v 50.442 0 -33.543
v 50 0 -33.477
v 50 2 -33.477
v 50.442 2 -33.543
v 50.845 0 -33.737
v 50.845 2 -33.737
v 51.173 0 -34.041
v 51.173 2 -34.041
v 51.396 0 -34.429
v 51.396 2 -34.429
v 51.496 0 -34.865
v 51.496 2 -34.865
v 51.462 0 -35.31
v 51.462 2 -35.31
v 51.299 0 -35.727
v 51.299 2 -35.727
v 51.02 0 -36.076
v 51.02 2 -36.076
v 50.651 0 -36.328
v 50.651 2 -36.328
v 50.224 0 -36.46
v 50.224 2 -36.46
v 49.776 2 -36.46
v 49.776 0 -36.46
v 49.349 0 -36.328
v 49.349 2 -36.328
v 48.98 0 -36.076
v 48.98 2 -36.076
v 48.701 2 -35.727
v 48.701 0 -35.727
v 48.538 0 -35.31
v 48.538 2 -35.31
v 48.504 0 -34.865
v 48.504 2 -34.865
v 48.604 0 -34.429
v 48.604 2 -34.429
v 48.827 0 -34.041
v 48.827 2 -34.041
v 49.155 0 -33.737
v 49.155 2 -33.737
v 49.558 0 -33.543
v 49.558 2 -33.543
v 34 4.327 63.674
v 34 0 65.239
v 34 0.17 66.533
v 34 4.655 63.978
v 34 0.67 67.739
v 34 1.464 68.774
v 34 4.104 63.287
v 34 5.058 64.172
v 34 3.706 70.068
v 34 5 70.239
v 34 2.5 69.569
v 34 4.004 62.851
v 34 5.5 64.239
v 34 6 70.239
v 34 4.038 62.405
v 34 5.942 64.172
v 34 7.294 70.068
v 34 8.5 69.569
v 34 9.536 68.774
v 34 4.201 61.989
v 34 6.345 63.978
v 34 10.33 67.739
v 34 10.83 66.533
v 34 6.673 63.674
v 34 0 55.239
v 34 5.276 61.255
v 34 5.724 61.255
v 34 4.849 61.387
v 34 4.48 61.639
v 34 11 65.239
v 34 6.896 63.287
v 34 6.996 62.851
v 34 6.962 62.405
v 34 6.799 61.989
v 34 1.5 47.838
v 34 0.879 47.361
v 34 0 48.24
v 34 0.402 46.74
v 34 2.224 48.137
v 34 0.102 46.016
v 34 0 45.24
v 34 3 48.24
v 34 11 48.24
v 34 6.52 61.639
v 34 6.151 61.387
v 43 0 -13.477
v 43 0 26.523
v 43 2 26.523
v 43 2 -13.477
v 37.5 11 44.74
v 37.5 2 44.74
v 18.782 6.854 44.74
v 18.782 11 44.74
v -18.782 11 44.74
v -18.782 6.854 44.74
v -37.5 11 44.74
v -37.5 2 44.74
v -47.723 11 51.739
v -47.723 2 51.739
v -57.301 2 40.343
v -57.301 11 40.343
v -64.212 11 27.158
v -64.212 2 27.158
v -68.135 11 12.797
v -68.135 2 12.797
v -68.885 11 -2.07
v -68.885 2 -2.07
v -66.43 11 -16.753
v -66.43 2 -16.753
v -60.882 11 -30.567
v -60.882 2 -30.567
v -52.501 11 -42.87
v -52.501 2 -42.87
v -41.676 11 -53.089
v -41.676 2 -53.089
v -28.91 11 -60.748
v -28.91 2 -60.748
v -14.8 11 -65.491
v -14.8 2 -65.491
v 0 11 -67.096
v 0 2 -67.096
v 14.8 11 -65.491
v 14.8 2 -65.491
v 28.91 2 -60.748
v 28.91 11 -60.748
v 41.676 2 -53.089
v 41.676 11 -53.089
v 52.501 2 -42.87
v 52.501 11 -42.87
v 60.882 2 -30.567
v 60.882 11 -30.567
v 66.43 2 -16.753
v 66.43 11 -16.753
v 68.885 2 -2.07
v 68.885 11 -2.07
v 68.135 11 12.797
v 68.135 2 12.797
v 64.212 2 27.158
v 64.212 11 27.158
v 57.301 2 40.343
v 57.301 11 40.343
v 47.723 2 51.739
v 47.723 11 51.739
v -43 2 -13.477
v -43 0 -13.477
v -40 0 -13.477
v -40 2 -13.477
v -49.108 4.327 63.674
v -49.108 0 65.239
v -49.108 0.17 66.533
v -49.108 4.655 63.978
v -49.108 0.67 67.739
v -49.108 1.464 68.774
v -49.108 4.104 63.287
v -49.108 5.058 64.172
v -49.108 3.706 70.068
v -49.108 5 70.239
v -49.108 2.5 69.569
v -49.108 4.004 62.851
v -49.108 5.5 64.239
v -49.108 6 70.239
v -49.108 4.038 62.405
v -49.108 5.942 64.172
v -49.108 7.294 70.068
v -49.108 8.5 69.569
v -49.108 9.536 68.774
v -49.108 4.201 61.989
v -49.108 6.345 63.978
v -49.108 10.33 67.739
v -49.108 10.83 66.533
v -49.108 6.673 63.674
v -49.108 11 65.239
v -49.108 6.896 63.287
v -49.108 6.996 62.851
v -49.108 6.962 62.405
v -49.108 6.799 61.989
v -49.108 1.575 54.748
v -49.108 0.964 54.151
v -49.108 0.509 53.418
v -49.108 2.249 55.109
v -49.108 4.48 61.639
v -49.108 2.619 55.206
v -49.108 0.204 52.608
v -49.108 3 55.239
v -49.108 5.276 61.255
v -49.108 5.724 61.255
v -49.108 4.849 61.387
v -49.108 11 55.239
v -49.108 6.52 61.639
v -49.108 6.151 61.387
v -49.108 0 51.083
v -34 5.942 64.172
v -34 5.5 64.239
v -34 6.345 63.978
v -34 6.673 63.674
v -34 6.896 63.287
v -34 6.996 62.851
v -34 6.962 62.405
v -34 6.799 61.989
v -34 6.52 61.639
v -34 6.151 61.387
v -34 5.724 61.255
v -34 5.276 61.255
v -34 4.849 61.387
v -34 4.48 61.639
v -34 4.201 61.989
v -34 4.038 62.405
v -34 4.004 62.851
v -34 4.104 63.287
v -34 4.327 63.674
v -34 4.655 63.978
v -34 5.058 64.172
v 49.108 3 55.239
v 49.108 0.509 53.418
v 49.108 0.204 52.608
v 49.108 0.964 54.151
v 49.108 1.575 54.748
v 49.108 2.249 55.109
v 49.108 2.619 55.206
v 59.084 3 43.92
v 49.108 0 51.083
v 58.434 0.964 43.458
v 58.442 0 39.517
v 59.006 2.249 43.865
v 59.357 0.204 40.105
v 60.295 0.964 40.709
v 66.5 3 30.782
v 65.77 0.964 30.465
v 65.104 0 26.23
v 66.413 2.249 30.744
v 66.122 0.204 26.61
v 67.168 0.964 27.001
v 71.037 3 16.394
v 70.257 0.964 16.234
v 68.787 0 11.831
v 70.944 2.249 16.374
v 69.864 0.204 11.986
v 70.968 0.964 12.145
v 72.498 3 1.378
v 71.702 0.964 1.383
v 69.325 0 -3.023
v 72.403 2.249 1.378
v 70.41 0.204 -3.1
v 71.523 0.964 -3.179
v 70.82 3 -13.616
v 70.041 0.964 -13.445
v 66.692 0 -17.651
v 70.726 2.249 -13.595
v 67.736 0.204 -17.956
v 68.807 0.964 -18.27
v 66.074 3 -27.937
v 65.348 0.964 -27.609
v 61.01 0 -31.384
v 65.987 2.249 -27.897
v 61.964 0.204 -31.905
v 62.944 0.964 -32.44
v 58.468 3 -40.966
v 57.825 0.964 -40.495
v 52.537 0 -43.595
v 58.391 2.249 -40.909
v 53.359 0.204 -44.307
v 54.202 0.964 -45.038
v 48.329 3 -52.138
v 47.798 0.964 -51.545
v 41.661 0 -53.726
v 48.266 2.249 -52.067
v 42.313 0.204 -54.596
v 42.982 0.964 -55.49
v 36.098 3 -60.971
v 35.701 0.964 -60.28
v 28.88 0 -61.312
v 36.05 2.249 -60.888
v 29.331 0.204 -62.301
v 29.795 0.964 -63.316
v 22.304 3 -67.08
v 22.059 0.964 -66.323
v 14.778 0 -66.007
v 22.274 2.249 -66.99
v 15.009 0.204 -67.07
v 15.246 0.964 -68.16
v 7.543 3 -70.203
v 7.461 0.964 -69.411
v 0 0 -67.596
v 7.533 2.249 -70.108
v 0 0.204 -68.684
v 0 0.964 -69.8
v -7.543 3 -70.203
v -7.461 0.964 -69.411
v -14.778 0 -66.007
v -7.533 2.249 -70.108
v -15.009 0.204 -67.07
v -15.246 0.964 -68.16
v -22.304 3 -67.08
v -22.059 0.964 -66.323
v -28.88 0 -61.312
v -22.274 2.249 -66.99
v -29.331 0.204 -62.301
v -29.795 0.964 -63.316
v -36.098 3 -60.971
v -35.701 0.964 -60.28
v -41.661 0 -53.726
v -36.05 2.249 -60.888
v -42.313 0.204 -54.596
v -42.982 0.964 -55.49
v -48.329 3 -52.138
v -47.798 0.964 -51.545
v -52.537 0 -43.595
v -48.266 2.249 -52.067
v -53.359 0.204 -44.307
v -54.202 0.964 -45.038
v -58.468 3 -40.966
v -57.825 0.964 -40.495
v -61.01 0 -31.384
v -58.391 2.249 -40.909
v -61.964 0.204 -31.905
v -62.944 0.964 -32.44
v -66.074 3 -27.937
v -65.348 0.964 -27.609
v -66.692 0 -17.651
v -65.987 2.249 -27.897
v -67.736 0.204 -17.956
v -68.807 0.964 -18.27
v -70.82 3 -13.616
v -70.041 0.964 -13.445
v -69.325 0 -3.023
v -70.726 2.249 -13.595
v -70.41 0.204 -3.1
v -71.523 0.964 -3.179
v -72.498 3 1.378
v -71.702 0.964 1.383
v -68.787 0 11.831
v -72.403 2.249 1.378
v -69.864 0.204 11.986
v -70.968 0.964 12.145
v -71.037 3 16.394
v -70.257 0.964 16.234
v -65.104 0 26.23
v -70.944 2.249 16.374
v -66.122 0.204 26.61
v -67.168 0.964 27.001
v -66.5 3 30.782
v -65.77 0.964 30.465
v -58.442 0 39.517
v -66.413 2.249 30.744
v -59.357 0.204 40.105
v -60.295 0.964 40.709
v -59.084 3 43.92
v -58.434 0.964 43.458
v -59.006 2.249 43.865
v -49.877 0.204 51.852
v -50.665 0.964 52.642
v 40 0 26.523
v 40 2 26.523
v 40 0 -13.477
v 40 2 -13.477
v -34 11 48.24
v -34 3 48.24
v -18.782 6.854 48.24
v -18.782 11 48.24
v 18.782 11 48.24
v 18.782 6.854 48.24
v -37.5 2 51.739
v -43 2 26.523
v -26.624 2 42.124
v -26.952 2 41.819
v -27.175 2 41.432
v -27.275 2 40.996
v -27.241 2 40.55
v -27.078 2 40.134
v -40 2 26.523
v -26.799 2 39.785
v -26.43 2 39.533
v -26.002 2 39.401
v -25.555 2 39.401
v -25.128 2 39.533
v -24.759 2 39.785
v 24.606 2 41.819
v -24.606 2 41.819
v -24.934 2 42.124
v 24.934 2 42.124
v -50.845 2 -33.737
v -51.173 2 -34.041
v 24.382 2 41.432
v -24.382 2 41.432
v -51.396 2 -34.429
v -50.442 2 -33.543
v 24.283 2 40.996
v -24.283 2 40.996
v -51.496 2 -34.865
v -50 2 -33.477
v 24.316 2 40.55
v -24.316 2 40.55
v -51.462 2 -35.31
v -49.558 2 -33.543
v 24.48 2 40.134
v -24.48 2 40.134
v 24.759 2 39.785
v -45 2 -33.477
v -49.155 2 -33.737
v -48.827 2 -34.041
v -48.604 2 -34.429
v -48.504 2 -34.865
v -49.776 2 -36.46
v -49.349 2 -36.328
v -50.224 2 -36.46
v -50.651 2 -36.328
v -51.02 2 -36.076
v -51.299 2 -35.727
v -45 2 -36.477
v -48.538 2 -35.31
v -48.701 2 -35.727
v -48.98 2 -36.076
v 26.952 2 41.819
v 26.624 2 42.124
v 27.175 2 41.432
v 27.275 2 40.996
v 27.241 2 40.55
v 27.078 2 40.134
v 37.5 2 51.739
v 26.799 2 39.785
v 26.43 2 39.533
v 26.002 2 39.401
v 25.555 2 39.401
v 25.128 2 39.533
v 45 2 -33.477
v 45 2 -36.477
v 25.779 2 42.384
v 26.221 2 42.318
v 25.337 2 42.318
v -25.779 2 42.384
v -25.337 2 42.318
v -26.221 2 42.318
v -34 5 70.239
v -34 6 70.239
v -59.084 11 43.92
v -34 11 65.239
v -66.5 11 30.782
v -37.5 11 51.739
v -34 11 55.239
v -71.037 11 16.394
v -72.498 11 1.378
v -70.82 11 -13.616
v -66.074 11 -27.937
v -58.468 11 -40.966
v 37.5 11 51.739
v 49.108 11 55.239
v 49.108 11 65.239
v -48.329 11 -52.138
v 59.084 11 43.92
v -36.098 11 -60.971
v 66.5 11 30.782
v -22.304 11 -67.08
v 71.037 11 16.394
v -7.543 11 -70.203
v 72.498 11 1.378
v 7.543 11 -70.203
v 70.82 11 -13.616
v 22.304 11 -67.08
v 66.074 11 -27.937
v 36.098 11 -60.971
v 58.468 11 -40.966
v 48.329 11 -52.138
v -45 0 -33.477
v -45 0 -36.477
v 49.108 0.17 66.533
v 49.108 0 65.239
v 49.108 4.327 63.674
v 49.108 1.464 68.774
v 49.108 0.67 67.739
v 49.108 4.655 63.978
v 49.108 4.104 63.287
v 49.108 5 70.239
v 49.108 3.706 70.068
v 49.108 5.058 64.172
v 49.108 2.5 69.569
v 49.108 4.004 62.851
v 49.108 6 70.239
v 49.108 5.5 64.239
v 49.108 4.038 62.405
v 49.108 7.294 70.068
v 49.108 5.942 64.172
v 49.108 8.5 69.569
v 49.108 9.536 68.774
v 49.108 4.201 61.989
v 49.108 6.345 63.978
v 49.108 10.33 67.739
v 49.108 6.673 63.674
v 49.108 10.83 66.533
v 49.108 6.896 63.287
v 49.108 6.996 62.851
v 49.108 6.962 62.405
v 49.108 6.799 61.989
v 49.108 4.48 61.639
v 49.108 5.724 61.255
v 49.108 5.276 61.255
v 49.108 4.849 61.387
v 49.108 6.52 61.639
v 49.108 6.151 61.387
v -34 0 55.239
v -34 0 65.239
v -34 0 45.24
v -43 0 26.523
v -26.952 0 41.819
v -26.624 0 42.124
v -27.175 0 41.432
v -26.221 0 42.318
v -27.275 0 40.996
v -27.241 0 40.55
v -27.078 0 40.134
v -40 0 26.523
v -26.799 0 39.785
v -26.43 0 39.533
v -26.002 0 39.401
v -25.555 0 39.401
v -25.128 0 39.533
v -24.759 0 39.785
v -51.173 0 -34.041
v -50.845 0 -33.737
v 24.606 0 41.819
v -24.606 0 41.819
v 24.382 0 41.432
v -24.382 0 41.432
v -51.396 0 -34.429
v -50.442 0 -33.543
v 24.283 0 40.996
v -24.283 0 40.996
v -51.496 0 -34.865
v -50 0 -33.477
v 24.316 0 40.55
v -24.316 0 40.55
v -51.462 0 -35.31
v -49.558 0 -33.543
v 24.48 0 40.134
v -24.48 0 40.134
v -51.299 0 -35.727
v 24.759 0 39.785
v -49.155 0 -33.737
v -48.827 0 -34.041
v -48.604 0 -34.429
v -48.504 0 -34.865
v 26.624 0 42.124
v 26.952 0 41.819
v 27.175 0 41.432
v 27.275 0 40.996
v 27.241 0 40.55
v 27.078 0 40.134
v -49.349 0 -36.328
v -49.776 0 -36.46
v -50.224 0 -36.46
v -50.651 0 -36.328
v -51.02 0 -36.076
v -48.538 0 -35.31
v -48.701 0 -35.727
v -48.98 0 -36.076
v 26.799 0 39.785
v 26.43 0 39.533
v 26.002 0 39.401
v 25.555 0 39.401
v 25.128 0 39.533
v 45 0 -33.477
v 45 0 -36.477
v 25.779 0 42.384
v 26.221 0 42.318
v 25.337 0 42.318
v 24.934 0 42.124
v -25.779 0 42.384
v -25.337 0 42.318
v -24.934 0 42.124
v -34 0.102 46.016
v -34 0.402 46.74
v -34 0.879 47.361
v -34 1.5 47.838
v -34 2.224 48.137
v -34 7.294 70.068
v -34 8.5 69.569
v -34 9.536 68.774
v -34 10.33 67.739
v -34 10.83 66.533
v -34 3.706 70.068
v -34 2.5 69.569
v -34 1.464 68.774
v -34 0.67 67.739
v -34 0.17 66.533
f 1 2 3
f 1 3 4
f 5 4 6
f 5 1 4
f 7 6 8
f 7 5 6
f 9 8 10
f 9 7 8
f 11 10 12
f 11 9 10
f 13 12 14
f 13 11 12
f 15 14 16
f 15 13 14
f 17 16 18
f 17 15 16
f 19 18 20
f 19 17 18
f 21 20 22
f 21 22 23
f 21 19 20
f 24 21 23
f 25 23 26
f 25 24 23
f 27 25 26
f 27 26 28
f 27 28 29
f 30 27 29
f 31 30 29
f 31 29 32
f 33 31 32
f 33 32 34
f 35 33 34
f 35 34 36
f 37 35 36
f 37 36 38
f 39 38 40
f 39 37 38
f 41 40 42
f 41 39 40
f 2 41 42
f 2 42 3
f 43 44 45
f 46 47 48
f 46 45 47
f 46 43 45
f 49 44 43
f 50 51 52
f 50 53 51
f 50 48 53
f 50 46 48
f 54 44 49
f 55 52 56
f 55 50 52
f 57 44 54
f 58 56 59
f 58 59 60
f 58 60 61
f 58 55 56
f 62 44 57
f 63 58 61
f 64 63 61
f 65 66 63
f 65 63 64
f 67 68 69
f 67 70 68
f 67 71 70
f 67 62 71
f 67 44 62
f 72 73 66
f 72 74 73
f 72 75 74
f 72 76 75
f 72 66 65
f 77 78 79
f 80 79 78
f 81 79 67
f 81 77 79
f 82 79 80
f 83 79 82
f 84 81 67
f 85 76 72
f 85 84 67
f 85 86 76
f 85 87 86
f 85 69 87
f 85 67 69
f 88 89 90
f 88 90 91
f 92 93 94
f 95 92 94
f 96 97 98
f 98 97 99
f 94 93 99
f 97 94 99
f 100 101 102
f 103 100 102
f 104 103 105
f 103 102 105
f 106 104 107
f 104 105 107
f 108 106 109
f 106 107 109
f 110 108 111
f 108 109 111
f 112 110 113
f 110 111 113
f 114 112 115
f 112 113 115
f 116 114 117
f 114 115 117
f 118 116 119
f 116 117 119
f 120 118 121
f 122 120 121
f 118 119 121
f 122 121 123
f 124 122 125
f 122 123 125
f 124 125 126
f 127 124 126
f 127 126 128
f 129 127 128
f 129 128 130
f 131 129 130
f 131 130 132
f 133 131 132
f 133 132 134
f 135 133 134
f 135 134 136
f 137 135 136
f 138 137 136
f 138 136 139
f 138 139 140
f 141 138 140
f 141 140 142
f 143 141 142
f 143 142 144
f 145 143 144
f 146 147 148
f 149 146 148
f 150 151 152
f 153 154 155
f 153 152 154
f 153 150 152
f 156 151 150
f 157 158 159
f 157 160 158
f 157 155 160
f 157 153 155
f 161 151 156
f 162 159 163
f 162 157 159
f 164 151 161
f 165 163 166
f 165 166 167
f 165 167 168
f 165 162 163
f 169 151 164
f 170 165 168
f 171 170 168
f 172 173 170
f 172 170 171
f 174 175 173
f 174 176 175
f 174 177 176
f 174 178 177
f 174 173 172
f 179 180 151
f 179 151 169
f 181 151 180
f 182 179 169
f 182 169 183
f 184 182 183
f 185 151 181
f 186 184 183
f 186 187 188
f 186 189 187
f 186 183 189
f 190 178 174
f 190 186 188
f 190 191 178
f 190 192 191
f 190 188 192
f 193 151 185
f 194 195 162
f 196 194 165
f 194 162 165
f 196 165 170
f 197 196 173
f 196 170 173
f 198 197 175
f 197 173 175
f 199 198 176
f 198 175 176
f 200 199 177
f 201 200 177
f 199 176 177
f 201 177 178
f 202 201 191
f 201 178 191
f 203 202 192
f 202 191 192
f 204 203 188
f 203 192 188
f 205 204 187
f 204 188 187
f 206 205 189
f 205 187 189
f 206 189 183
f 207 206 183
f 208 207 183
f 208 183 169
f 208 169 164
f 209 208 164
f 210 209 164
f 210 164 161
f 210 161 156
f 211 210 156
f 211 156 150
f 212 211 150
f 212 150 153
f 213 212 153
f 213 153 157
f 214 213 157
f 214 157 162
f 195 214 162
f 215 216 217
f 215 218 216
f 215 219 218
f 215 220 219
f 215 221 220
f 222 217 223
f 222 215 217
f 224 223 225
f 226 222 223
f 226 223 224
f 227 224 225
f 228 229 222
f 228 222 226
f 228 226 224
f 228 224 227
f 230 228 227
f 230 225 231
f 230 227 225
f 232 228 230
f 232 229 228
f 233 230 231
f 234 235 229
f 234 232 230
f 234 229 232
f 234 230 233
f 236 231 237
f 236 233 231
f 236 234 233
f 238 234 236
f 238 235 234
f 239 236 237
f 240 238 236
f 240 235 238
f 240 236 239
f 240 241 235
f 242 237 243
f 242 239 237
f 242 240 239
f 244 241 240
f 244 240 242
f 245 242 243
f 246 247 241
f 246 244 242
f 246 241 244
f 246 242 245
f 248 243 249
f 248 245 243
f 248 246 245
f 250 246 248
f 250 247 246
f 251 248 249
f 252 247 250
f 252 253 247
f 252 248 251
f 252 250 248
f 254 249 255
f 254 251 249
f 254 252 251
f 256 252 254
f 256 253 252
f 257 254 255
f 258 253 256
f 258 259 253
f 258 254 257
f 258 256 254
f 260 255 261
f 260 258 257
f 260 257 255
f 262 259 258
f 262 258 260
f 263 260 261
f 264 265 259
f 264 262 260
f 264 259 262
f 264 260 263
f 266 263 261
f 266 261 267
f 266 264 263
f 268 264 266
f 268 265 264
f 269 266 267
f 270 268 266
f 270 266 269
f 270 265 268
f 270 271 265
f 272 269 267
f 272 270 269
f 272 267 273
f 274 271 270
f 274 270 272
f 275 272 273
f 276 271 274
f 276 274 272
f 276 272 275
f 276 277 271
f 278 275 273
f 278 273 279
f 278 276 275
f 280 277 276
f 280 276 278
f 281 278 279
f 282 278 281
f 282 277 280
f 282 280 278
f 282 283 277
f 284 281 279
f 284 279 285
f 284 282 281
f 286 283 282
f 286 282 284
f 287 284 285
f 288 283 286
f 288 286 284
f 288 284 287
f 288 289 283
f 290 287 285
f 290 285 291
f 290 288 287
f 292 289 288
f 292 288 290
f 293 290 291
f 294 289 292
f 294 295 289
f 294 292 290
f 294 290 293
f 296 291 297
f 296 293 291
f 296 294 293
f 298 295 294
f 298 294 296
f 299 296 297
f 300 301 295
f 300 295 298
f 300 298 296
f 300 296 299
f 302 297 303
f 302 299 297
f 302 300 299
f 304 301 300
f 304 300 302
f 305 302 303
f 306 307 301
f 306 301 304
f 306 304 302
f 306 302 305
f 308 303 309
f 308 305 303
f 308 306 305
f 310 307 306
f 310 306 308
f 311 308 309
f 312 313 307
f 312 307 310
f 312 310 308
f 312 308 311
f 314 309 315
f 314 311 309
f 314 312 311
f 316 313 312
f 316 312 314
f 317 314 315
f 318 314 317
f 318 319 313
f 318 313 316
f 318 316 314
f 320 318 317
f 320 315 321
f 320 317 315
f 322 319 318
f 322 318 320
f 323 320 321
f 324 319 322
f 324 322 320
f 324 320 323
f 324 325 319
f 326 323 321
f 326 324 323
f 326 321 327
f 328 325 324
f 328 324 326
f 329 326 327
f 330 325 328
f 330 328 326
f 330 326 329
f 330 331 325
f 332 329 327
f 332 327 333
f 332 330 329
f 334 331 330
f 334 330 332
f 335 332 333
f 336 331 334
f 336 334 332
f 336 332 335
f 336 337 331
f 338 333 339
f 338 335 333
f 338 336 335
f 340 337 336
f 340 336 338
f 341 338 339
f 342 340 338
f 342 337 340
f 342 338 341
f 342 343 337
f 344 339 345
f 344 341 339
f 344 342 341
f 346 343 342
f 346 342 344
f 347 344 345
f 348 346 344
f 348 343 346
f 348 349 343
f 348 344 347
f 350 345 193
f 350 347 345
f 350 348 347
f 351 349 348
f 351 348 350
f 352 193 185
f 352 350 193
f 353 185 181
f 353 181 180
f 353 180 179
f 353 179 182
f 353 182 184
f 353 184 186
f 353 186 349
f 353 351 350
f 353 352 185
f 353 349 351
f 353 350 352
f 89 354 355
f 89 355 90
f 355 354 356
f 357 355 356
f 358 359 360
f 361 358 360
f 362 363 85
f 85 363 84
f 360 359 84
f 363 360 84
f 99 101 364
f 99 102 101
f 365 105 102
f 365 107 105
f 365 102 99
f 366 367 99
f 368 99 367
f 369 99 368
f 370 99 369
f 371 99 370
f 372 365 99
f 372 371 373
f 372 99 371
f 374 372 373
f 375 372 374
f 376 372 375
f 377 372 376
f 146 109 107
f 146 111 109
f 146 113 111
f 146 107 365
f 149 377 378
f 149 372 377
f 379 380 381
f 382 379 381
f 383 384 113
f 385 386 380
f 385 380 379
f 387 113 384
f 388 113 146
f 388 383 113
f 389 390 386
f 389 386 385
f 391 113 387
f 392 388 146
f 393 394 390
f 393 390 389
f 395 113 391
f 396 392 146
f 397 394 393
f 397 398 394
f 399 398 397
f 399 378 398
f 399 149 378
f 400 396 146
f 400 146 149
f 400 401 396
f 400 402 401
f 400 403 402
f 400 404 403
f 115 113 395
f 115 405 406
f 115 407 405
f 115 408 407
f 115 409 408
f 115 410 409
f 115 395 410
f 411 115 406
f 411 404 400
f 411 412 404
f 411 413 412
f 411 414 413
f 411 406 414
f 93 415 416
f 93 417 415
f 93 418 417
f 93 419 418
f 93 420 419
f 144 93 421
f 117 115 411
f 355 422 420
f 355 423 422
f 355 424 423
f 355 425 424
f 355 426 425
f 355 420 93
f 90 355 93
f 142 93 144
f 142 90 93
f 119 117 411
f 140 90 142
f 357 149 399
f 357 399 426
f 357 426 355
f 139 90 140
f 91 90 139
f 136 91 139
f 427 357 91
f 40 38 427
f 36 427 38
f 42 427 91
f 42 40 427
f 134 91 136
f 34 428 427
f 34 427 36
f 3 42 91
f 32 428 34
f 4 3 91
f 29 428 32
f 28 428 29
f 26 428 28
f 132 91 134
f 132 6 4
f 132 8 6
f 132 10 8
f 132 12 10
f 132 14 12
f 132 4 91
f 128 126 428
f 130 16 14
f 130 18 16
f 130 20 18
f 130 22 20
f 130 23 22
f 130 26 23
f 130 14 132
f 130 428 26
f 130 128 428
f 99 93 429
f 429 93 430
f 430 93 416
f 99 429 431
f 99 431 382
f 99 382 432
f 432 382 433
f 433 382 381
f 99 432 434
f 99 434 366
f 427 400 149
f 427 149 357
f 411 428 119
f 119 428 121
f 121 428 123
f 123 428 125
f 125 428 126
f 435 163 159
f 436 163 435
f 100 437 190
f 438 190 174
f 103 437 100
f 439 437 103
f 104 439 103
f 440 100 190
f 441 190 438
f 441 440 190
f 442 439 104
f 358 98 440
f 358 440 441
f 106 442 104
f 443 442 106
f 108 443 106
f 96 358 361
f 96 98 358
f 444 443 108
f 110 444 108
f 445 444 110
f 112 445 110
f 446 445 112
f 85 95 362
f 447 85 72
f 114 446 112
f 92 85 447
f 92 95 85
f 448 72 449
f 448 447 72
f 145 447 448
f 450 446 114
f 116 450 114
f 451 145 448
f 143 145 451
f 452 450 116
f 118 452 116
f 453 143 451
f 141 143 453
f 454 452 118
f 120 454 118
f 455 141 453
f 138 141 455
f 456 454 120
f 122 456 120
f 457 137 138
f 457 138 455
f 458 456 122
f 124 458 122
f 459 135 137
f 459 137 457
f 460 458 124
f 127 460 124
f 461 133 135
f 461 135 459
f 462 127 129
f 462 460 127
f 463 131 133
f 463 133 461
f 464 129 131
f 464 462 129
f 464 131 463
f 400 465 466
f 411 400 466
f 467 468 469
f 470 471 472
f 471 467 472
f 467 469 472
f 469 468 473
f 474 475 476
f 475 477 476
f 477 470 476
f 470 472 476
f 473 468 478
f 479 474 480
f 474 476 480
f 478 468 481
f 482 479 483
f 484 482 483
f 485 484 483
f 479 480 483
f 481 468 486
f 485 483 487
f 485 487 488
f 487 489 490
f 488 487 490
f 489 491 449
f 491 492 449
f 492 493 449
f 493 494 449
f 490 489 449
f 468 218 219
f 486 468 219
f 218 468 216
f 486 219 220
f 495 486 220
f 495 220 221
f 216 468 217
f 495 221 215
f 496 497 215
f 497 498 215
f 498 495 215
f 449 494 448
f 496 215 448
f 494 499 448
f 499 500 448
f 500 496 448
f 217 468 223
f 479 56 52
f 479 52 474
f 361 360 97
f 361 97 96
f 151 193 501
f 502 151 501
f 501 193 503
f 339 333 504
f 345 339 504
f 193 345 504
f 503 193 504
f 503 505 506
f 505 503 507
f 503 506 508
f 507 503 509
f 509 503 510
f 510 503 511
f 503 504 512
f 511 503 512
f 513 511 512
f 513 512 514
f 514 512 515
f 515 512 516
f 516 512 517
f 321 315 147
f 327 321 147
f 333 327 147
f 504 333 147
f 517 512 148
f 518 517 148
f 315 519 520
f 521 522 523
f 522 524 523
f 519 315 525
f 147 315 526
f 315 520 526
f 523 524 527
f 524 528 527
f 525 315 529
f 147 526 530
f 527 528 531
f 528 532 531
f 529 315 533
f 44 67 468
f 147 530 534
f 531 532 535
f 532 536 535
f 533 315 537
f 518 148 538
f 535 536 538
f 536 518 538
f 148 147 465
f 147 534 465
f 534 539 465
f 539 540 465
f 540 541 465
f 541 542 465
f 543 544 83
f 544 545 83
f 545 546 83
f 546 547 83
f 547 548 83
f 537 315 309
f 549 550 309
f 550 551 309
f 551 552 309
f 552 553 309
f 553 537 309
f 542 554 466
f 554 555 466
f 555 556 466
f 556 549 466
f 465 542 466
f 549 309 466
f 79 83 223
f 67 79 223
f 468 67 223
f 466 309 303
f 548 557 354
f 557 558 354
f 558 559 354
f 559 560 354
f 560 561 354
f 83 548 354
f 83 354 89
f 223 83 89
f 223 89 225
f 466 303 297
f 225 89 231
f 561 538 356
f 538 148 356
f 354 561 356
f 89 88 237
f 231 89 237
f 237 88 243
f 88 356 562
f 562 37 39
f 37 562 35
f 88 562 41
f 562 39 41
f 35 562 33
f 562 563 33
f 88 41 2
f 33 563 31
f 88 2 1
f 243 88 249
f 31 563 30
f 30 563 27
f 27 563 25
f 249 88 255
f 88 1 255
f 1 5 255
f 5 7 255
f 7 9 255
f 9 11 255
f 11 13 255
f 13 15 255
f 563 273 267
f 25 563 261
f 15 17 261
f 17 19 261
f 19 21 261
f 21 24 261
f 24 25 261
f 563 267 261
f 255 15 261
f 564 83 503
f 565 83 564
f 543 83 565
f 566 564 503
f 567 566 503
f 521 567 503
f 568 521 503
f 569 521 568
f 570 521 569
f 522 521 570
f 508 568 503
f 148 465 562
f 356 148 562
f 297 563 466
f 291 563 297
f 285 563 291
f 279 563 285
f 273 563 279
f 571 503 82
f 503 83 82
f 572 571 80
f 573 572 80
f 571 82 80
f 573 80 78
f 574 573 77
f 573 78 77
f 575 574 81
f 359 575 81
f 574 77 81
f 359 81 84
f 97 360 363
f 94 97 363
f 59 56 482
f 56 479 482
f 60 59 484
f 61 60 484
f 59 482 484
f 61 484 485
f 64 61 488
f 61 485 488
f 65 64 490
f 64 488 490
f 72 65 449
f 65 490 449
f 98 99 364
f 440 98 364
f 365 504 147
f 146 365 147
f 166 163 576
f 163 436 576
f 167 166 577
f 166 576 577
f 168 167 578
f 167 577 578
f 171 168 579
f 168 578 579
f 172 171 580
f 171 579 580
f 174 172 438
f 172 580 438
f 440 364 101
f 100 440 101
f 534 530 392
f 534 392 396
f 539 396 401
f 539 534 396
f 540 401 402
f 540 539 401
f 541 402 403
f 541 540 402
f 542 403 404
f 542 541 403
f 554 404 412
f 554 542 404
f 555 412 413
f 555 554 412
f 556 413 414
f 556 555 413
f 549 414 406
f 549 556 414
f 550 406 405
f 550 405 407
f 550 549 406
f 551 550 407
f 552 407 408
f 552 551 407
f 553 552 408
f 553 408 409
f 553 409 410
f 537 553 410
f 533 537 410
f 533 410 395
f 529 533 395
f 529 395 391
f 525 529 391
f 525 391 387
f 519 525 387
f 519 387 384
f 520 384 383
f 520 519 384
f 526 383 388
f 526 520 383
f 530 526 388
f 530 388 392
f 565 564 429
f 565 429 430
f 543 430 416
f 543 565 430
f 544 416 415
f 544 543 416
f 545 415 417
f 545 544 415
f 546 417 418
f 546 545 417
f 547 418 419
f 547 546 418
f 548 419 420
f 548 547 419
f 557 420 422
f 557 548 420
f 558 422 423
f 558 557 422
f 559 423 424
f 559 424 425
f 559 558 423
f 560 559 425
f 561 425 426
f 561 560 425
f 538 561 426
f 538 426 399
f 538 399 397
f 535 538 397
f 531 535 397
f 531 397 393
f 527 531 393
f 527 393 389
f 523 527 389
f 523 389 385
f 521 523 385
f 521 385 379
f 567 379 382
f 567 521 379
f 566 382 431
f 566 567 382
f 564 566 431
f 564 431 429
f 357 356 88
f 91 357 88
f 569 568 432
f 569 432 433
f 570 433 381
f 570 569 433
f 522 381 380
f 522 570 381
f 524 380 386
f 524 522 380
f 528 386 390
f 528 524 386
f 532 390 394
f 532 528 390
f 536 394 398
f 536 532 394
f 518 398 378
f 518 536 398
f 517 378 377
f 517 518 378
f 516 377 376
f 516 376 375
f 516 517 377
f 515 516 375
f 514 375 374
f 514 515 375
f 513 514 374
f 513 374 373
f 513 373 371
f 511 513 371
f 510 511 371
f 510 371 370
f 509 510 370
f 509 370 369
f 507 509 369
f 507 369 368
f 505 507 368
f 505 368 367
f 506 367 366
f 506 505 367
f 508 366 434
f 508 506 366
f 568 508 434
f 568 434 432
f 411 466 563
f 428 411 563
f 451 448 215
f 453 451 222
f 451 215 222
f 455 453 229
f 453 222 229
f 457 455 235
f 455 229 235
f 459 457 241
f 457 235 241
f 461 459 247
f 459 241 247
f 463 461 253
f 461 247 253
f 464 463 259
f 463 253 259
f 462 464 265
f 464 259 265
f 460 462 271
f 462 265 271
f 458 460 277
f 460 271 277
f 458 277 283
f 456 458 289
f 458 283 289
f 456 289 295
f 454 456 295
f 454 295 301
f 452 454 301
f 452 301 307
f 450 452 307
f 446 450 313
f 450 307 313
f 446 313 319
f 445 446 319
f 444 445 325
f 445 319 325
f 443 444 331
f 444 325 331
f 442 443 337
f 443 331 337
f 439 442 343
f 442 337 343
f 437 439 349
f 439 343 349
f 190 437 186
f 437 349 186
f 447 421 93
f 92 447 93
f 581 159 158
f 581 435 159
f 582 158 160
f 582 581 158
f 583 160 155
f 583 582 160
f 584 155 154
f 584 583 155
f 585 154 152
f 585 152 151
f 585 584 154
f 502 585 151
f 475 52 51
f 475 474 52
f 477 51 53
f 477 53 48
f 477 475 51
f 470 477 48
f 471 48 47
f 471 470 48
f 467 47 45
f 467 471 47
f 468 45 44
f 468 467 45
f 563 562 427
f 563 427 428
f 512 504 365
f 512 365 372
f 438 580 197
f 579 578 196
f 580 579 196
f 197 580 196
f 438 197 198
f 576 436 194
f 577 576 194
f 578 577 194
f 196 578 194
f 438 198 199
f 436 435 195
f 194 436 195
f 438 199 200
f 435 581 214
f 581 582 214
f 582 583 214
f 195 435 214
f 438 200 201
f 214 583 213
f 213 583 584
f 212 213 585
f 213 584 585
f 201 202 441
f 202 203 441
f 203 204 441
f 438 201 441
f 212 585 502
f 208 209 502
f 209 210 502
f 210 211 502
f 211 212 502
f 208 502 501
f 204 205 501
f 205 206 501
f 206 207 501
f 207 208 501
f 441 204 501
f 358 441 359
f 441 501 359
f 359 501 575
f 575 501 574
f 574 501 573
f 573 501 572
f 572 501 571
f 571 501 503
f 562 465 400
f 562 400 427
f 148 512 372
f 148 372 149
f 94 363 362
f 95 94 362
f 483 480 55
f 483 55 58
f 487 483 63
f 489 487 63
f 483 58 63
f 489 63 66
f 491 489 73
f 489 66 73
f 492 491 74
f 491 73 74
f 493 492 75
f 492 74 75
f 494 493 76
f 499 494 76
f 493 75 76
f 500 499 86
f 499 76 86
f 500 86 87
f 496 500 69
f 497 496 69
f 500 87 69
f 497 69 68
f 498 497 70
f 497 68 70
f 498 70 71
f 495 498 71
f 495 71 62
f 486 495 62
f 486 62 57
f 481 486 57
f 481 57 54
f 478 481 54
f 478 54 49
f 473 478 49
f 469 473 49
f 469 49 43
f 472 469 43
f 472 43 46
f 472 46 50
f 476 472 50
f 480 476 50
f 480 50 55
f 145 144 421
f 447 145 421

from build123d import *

# Parameters (mm, degrees)
SKETCH1_R           = 1.5
SKETCH1_W           = 3
SKETCH1_H           = 40
SKETCH1_W_2         = 90
SKETCH1_H_2         = 3
BOSS_EXTRUDE1_DEPTH = 2
BOSS_EXTRUDE2_DEPTH = 11
SKETCH3_W           = 15.108365525
SKETCH3_H           = 11
BOSS_EXTRUDE3_DEPTH = 15
SKETCH4_R           = 1.5
CUT_EXTRUDE1_DEPTH  = 115
FILLET2_R           = 3
FILLET3_R           = 5
SKETCH5_W           = 37.563728852
SKETCH5_H           = 8.292532788
CUT_EXTRUDE2_DEPTH  = 10


with BuildPart() as part:
    # Sketch1 → Boss-Extrude1 (new body)
    with BuildSketch(Plane(origin=(0, 0, 0), x_dir=(1, 0, 0), z_dir=(0, 1, 0))):
        with BuildLine():
            ThreePointArc((49.108365525, -55.238537207), (0, 70.596427268), (-49.108365525, -55.238537207))
            Line((-49.108365525, -55.238537207), (-34, -55.238537207))
            Line((-34, -55.238537207), (-34, -48.239677752))
            Line((-34, -48.239677752), (34, -48.239677752))
            Line((34, -48.239677752), (34, -55.238537207))
            Line((34, -55.238537207), (49.108365525, -55.238537207))
        make_face()
        with Locations((-25.778764696, -40.884208465)):
            Circle(SKETCH1_R, mode=Mode.SUBTRACT)
        with Locations((-41.5, -6.523357214)):
            Rectangle(SKETCH1_W, SKETCH1_H, mode=Mode.SUBTRACT)
        with Locations((25.778764693, -40.884208467)):
            Circle(SKETCH1_R, mode=Mode.SUBTRACT)
        with Locations((41.5, -6.523357214)):
            Rectangle(SKETCH1_W, SKETCH1_H, mode=Mode.SUBTRACT)
        with Locations((-50, 34.976642786)):
            Circle(SKETCH1_R, mode=Mode.SUBTRACT)
        with Locations((0, 34.976642786)):
            Rectangle(SKETCH1_W_2, SKETCH1_H_2, mode=Mode.SUBTRACT)
        with Locations((50, 34.976642786)):
            Circle(SKETCH1_R, mode=Mode.SUBTRACT)
    extrude(amount=BOSS_EXTRUDE1_DEPTH)

    # Sketch1<3> → Boss-Extrude2 (add)
    with BuildSketch(Plane(origin=(0, 0, 0), x_dir=(1, 0, 0), z_dir=(0, 1, 0))):
        with BuildLine():
            ThreePointArc((49.108365525, -55.238537207), (0, 70.596427268), (-49.108365525, -55.238537207))
            Line((-49.108365525, -55.238537207), (-34, -55.238537207))
            Line((-34, -55.238537207), (-34, -48.239677752))
            Line((-34, -48.239677752), (34, -48.239677752))
            Line((34, -48.239677752), (34, -55.238537207))
            Line((34, -55.238537207), (49.108365525, -55.238537207))
        make_face()
        with BuildLine():
            Line((-37.5, -51.738537207), (-47.722911854, -51.738537207))
            ThreePointArc((-47.722911854, -51.738537207), (0, 67.096427268), (47.722911854, -51.738537207))
            Line((47.722911854, -51.738537207), (37.5, -51.738537207))
            Line((37.5, -51.738537207), (37.5, -44.739677752))
            Line((37.5, -44.739677752), (-37.5, -44.739677752))
            Line((-37.5, -44.739677752), (-37.5, -51.738537207))
        make_face(mode=Mode.SUBTRACT)
    extrude(amount=BOSS_EXTRUDE2_DEPTH)

    # Sketch3 → Boss-Extrude3 (add)
    with BuildSketch(Plane.XY.offset(55.238537207)):
        with Locations((41.554182763, 5.5)):
            Rectangle(SKETCH3_W, SKETCH3_H)
        with Locations((-41.554182763, 5.5)):
            Rectangle(SKETCH3_W, SKETCH3_H)
    extrude(amount=BOSS_EXTRUDE3_DEPTH)

    # Sketch4 → Cut-Extrude1 (cut)
    with BuildSketch(Plane.ZY.offset(49.108365525)):
        with Locations((62.738537207, 5.5)):
            Circle(SKETCH4_R)
    extrude(amount=-CUT_EXTRUDE1_DEPTH, mode=Mode.SUBTRACT)

    # Fillet2
    fillet2_edges = [part.edges().sort_by_distance(p)[0] for p in [
        (0, 0, 48.239677752),
        (0, 0, -70.596427268),
    ]]
    fillet(fillet2_edges, radius=FILLET2_R)

    # Fillet3
    fillet3_edges = [part.edges().sort_by_distance(p)[0] for p in [
        (41.554182762, 0, 70.238537207),
        (41.554182762, 11, 70.238537207),
        (-41.554182762, 0, 70.238537207),
        (-41.554182762, 11, 70.238537207),
    ]]
    fillet(fillet3_edges, radius=FILLET3_R)

    # Sketch5 → Cut-Extrude2 (cut)
    with BuildSketch(Plane.XY.offset(48.239677752)):
        with Locations((0, 11)):
            Rectangle(SKETCH5_W, SKETCH5_H)
    extrude(amount=-CUT_EXTRUDE2_DEPTH, mode=Mode.SUBTRACT)


solid = part.part
